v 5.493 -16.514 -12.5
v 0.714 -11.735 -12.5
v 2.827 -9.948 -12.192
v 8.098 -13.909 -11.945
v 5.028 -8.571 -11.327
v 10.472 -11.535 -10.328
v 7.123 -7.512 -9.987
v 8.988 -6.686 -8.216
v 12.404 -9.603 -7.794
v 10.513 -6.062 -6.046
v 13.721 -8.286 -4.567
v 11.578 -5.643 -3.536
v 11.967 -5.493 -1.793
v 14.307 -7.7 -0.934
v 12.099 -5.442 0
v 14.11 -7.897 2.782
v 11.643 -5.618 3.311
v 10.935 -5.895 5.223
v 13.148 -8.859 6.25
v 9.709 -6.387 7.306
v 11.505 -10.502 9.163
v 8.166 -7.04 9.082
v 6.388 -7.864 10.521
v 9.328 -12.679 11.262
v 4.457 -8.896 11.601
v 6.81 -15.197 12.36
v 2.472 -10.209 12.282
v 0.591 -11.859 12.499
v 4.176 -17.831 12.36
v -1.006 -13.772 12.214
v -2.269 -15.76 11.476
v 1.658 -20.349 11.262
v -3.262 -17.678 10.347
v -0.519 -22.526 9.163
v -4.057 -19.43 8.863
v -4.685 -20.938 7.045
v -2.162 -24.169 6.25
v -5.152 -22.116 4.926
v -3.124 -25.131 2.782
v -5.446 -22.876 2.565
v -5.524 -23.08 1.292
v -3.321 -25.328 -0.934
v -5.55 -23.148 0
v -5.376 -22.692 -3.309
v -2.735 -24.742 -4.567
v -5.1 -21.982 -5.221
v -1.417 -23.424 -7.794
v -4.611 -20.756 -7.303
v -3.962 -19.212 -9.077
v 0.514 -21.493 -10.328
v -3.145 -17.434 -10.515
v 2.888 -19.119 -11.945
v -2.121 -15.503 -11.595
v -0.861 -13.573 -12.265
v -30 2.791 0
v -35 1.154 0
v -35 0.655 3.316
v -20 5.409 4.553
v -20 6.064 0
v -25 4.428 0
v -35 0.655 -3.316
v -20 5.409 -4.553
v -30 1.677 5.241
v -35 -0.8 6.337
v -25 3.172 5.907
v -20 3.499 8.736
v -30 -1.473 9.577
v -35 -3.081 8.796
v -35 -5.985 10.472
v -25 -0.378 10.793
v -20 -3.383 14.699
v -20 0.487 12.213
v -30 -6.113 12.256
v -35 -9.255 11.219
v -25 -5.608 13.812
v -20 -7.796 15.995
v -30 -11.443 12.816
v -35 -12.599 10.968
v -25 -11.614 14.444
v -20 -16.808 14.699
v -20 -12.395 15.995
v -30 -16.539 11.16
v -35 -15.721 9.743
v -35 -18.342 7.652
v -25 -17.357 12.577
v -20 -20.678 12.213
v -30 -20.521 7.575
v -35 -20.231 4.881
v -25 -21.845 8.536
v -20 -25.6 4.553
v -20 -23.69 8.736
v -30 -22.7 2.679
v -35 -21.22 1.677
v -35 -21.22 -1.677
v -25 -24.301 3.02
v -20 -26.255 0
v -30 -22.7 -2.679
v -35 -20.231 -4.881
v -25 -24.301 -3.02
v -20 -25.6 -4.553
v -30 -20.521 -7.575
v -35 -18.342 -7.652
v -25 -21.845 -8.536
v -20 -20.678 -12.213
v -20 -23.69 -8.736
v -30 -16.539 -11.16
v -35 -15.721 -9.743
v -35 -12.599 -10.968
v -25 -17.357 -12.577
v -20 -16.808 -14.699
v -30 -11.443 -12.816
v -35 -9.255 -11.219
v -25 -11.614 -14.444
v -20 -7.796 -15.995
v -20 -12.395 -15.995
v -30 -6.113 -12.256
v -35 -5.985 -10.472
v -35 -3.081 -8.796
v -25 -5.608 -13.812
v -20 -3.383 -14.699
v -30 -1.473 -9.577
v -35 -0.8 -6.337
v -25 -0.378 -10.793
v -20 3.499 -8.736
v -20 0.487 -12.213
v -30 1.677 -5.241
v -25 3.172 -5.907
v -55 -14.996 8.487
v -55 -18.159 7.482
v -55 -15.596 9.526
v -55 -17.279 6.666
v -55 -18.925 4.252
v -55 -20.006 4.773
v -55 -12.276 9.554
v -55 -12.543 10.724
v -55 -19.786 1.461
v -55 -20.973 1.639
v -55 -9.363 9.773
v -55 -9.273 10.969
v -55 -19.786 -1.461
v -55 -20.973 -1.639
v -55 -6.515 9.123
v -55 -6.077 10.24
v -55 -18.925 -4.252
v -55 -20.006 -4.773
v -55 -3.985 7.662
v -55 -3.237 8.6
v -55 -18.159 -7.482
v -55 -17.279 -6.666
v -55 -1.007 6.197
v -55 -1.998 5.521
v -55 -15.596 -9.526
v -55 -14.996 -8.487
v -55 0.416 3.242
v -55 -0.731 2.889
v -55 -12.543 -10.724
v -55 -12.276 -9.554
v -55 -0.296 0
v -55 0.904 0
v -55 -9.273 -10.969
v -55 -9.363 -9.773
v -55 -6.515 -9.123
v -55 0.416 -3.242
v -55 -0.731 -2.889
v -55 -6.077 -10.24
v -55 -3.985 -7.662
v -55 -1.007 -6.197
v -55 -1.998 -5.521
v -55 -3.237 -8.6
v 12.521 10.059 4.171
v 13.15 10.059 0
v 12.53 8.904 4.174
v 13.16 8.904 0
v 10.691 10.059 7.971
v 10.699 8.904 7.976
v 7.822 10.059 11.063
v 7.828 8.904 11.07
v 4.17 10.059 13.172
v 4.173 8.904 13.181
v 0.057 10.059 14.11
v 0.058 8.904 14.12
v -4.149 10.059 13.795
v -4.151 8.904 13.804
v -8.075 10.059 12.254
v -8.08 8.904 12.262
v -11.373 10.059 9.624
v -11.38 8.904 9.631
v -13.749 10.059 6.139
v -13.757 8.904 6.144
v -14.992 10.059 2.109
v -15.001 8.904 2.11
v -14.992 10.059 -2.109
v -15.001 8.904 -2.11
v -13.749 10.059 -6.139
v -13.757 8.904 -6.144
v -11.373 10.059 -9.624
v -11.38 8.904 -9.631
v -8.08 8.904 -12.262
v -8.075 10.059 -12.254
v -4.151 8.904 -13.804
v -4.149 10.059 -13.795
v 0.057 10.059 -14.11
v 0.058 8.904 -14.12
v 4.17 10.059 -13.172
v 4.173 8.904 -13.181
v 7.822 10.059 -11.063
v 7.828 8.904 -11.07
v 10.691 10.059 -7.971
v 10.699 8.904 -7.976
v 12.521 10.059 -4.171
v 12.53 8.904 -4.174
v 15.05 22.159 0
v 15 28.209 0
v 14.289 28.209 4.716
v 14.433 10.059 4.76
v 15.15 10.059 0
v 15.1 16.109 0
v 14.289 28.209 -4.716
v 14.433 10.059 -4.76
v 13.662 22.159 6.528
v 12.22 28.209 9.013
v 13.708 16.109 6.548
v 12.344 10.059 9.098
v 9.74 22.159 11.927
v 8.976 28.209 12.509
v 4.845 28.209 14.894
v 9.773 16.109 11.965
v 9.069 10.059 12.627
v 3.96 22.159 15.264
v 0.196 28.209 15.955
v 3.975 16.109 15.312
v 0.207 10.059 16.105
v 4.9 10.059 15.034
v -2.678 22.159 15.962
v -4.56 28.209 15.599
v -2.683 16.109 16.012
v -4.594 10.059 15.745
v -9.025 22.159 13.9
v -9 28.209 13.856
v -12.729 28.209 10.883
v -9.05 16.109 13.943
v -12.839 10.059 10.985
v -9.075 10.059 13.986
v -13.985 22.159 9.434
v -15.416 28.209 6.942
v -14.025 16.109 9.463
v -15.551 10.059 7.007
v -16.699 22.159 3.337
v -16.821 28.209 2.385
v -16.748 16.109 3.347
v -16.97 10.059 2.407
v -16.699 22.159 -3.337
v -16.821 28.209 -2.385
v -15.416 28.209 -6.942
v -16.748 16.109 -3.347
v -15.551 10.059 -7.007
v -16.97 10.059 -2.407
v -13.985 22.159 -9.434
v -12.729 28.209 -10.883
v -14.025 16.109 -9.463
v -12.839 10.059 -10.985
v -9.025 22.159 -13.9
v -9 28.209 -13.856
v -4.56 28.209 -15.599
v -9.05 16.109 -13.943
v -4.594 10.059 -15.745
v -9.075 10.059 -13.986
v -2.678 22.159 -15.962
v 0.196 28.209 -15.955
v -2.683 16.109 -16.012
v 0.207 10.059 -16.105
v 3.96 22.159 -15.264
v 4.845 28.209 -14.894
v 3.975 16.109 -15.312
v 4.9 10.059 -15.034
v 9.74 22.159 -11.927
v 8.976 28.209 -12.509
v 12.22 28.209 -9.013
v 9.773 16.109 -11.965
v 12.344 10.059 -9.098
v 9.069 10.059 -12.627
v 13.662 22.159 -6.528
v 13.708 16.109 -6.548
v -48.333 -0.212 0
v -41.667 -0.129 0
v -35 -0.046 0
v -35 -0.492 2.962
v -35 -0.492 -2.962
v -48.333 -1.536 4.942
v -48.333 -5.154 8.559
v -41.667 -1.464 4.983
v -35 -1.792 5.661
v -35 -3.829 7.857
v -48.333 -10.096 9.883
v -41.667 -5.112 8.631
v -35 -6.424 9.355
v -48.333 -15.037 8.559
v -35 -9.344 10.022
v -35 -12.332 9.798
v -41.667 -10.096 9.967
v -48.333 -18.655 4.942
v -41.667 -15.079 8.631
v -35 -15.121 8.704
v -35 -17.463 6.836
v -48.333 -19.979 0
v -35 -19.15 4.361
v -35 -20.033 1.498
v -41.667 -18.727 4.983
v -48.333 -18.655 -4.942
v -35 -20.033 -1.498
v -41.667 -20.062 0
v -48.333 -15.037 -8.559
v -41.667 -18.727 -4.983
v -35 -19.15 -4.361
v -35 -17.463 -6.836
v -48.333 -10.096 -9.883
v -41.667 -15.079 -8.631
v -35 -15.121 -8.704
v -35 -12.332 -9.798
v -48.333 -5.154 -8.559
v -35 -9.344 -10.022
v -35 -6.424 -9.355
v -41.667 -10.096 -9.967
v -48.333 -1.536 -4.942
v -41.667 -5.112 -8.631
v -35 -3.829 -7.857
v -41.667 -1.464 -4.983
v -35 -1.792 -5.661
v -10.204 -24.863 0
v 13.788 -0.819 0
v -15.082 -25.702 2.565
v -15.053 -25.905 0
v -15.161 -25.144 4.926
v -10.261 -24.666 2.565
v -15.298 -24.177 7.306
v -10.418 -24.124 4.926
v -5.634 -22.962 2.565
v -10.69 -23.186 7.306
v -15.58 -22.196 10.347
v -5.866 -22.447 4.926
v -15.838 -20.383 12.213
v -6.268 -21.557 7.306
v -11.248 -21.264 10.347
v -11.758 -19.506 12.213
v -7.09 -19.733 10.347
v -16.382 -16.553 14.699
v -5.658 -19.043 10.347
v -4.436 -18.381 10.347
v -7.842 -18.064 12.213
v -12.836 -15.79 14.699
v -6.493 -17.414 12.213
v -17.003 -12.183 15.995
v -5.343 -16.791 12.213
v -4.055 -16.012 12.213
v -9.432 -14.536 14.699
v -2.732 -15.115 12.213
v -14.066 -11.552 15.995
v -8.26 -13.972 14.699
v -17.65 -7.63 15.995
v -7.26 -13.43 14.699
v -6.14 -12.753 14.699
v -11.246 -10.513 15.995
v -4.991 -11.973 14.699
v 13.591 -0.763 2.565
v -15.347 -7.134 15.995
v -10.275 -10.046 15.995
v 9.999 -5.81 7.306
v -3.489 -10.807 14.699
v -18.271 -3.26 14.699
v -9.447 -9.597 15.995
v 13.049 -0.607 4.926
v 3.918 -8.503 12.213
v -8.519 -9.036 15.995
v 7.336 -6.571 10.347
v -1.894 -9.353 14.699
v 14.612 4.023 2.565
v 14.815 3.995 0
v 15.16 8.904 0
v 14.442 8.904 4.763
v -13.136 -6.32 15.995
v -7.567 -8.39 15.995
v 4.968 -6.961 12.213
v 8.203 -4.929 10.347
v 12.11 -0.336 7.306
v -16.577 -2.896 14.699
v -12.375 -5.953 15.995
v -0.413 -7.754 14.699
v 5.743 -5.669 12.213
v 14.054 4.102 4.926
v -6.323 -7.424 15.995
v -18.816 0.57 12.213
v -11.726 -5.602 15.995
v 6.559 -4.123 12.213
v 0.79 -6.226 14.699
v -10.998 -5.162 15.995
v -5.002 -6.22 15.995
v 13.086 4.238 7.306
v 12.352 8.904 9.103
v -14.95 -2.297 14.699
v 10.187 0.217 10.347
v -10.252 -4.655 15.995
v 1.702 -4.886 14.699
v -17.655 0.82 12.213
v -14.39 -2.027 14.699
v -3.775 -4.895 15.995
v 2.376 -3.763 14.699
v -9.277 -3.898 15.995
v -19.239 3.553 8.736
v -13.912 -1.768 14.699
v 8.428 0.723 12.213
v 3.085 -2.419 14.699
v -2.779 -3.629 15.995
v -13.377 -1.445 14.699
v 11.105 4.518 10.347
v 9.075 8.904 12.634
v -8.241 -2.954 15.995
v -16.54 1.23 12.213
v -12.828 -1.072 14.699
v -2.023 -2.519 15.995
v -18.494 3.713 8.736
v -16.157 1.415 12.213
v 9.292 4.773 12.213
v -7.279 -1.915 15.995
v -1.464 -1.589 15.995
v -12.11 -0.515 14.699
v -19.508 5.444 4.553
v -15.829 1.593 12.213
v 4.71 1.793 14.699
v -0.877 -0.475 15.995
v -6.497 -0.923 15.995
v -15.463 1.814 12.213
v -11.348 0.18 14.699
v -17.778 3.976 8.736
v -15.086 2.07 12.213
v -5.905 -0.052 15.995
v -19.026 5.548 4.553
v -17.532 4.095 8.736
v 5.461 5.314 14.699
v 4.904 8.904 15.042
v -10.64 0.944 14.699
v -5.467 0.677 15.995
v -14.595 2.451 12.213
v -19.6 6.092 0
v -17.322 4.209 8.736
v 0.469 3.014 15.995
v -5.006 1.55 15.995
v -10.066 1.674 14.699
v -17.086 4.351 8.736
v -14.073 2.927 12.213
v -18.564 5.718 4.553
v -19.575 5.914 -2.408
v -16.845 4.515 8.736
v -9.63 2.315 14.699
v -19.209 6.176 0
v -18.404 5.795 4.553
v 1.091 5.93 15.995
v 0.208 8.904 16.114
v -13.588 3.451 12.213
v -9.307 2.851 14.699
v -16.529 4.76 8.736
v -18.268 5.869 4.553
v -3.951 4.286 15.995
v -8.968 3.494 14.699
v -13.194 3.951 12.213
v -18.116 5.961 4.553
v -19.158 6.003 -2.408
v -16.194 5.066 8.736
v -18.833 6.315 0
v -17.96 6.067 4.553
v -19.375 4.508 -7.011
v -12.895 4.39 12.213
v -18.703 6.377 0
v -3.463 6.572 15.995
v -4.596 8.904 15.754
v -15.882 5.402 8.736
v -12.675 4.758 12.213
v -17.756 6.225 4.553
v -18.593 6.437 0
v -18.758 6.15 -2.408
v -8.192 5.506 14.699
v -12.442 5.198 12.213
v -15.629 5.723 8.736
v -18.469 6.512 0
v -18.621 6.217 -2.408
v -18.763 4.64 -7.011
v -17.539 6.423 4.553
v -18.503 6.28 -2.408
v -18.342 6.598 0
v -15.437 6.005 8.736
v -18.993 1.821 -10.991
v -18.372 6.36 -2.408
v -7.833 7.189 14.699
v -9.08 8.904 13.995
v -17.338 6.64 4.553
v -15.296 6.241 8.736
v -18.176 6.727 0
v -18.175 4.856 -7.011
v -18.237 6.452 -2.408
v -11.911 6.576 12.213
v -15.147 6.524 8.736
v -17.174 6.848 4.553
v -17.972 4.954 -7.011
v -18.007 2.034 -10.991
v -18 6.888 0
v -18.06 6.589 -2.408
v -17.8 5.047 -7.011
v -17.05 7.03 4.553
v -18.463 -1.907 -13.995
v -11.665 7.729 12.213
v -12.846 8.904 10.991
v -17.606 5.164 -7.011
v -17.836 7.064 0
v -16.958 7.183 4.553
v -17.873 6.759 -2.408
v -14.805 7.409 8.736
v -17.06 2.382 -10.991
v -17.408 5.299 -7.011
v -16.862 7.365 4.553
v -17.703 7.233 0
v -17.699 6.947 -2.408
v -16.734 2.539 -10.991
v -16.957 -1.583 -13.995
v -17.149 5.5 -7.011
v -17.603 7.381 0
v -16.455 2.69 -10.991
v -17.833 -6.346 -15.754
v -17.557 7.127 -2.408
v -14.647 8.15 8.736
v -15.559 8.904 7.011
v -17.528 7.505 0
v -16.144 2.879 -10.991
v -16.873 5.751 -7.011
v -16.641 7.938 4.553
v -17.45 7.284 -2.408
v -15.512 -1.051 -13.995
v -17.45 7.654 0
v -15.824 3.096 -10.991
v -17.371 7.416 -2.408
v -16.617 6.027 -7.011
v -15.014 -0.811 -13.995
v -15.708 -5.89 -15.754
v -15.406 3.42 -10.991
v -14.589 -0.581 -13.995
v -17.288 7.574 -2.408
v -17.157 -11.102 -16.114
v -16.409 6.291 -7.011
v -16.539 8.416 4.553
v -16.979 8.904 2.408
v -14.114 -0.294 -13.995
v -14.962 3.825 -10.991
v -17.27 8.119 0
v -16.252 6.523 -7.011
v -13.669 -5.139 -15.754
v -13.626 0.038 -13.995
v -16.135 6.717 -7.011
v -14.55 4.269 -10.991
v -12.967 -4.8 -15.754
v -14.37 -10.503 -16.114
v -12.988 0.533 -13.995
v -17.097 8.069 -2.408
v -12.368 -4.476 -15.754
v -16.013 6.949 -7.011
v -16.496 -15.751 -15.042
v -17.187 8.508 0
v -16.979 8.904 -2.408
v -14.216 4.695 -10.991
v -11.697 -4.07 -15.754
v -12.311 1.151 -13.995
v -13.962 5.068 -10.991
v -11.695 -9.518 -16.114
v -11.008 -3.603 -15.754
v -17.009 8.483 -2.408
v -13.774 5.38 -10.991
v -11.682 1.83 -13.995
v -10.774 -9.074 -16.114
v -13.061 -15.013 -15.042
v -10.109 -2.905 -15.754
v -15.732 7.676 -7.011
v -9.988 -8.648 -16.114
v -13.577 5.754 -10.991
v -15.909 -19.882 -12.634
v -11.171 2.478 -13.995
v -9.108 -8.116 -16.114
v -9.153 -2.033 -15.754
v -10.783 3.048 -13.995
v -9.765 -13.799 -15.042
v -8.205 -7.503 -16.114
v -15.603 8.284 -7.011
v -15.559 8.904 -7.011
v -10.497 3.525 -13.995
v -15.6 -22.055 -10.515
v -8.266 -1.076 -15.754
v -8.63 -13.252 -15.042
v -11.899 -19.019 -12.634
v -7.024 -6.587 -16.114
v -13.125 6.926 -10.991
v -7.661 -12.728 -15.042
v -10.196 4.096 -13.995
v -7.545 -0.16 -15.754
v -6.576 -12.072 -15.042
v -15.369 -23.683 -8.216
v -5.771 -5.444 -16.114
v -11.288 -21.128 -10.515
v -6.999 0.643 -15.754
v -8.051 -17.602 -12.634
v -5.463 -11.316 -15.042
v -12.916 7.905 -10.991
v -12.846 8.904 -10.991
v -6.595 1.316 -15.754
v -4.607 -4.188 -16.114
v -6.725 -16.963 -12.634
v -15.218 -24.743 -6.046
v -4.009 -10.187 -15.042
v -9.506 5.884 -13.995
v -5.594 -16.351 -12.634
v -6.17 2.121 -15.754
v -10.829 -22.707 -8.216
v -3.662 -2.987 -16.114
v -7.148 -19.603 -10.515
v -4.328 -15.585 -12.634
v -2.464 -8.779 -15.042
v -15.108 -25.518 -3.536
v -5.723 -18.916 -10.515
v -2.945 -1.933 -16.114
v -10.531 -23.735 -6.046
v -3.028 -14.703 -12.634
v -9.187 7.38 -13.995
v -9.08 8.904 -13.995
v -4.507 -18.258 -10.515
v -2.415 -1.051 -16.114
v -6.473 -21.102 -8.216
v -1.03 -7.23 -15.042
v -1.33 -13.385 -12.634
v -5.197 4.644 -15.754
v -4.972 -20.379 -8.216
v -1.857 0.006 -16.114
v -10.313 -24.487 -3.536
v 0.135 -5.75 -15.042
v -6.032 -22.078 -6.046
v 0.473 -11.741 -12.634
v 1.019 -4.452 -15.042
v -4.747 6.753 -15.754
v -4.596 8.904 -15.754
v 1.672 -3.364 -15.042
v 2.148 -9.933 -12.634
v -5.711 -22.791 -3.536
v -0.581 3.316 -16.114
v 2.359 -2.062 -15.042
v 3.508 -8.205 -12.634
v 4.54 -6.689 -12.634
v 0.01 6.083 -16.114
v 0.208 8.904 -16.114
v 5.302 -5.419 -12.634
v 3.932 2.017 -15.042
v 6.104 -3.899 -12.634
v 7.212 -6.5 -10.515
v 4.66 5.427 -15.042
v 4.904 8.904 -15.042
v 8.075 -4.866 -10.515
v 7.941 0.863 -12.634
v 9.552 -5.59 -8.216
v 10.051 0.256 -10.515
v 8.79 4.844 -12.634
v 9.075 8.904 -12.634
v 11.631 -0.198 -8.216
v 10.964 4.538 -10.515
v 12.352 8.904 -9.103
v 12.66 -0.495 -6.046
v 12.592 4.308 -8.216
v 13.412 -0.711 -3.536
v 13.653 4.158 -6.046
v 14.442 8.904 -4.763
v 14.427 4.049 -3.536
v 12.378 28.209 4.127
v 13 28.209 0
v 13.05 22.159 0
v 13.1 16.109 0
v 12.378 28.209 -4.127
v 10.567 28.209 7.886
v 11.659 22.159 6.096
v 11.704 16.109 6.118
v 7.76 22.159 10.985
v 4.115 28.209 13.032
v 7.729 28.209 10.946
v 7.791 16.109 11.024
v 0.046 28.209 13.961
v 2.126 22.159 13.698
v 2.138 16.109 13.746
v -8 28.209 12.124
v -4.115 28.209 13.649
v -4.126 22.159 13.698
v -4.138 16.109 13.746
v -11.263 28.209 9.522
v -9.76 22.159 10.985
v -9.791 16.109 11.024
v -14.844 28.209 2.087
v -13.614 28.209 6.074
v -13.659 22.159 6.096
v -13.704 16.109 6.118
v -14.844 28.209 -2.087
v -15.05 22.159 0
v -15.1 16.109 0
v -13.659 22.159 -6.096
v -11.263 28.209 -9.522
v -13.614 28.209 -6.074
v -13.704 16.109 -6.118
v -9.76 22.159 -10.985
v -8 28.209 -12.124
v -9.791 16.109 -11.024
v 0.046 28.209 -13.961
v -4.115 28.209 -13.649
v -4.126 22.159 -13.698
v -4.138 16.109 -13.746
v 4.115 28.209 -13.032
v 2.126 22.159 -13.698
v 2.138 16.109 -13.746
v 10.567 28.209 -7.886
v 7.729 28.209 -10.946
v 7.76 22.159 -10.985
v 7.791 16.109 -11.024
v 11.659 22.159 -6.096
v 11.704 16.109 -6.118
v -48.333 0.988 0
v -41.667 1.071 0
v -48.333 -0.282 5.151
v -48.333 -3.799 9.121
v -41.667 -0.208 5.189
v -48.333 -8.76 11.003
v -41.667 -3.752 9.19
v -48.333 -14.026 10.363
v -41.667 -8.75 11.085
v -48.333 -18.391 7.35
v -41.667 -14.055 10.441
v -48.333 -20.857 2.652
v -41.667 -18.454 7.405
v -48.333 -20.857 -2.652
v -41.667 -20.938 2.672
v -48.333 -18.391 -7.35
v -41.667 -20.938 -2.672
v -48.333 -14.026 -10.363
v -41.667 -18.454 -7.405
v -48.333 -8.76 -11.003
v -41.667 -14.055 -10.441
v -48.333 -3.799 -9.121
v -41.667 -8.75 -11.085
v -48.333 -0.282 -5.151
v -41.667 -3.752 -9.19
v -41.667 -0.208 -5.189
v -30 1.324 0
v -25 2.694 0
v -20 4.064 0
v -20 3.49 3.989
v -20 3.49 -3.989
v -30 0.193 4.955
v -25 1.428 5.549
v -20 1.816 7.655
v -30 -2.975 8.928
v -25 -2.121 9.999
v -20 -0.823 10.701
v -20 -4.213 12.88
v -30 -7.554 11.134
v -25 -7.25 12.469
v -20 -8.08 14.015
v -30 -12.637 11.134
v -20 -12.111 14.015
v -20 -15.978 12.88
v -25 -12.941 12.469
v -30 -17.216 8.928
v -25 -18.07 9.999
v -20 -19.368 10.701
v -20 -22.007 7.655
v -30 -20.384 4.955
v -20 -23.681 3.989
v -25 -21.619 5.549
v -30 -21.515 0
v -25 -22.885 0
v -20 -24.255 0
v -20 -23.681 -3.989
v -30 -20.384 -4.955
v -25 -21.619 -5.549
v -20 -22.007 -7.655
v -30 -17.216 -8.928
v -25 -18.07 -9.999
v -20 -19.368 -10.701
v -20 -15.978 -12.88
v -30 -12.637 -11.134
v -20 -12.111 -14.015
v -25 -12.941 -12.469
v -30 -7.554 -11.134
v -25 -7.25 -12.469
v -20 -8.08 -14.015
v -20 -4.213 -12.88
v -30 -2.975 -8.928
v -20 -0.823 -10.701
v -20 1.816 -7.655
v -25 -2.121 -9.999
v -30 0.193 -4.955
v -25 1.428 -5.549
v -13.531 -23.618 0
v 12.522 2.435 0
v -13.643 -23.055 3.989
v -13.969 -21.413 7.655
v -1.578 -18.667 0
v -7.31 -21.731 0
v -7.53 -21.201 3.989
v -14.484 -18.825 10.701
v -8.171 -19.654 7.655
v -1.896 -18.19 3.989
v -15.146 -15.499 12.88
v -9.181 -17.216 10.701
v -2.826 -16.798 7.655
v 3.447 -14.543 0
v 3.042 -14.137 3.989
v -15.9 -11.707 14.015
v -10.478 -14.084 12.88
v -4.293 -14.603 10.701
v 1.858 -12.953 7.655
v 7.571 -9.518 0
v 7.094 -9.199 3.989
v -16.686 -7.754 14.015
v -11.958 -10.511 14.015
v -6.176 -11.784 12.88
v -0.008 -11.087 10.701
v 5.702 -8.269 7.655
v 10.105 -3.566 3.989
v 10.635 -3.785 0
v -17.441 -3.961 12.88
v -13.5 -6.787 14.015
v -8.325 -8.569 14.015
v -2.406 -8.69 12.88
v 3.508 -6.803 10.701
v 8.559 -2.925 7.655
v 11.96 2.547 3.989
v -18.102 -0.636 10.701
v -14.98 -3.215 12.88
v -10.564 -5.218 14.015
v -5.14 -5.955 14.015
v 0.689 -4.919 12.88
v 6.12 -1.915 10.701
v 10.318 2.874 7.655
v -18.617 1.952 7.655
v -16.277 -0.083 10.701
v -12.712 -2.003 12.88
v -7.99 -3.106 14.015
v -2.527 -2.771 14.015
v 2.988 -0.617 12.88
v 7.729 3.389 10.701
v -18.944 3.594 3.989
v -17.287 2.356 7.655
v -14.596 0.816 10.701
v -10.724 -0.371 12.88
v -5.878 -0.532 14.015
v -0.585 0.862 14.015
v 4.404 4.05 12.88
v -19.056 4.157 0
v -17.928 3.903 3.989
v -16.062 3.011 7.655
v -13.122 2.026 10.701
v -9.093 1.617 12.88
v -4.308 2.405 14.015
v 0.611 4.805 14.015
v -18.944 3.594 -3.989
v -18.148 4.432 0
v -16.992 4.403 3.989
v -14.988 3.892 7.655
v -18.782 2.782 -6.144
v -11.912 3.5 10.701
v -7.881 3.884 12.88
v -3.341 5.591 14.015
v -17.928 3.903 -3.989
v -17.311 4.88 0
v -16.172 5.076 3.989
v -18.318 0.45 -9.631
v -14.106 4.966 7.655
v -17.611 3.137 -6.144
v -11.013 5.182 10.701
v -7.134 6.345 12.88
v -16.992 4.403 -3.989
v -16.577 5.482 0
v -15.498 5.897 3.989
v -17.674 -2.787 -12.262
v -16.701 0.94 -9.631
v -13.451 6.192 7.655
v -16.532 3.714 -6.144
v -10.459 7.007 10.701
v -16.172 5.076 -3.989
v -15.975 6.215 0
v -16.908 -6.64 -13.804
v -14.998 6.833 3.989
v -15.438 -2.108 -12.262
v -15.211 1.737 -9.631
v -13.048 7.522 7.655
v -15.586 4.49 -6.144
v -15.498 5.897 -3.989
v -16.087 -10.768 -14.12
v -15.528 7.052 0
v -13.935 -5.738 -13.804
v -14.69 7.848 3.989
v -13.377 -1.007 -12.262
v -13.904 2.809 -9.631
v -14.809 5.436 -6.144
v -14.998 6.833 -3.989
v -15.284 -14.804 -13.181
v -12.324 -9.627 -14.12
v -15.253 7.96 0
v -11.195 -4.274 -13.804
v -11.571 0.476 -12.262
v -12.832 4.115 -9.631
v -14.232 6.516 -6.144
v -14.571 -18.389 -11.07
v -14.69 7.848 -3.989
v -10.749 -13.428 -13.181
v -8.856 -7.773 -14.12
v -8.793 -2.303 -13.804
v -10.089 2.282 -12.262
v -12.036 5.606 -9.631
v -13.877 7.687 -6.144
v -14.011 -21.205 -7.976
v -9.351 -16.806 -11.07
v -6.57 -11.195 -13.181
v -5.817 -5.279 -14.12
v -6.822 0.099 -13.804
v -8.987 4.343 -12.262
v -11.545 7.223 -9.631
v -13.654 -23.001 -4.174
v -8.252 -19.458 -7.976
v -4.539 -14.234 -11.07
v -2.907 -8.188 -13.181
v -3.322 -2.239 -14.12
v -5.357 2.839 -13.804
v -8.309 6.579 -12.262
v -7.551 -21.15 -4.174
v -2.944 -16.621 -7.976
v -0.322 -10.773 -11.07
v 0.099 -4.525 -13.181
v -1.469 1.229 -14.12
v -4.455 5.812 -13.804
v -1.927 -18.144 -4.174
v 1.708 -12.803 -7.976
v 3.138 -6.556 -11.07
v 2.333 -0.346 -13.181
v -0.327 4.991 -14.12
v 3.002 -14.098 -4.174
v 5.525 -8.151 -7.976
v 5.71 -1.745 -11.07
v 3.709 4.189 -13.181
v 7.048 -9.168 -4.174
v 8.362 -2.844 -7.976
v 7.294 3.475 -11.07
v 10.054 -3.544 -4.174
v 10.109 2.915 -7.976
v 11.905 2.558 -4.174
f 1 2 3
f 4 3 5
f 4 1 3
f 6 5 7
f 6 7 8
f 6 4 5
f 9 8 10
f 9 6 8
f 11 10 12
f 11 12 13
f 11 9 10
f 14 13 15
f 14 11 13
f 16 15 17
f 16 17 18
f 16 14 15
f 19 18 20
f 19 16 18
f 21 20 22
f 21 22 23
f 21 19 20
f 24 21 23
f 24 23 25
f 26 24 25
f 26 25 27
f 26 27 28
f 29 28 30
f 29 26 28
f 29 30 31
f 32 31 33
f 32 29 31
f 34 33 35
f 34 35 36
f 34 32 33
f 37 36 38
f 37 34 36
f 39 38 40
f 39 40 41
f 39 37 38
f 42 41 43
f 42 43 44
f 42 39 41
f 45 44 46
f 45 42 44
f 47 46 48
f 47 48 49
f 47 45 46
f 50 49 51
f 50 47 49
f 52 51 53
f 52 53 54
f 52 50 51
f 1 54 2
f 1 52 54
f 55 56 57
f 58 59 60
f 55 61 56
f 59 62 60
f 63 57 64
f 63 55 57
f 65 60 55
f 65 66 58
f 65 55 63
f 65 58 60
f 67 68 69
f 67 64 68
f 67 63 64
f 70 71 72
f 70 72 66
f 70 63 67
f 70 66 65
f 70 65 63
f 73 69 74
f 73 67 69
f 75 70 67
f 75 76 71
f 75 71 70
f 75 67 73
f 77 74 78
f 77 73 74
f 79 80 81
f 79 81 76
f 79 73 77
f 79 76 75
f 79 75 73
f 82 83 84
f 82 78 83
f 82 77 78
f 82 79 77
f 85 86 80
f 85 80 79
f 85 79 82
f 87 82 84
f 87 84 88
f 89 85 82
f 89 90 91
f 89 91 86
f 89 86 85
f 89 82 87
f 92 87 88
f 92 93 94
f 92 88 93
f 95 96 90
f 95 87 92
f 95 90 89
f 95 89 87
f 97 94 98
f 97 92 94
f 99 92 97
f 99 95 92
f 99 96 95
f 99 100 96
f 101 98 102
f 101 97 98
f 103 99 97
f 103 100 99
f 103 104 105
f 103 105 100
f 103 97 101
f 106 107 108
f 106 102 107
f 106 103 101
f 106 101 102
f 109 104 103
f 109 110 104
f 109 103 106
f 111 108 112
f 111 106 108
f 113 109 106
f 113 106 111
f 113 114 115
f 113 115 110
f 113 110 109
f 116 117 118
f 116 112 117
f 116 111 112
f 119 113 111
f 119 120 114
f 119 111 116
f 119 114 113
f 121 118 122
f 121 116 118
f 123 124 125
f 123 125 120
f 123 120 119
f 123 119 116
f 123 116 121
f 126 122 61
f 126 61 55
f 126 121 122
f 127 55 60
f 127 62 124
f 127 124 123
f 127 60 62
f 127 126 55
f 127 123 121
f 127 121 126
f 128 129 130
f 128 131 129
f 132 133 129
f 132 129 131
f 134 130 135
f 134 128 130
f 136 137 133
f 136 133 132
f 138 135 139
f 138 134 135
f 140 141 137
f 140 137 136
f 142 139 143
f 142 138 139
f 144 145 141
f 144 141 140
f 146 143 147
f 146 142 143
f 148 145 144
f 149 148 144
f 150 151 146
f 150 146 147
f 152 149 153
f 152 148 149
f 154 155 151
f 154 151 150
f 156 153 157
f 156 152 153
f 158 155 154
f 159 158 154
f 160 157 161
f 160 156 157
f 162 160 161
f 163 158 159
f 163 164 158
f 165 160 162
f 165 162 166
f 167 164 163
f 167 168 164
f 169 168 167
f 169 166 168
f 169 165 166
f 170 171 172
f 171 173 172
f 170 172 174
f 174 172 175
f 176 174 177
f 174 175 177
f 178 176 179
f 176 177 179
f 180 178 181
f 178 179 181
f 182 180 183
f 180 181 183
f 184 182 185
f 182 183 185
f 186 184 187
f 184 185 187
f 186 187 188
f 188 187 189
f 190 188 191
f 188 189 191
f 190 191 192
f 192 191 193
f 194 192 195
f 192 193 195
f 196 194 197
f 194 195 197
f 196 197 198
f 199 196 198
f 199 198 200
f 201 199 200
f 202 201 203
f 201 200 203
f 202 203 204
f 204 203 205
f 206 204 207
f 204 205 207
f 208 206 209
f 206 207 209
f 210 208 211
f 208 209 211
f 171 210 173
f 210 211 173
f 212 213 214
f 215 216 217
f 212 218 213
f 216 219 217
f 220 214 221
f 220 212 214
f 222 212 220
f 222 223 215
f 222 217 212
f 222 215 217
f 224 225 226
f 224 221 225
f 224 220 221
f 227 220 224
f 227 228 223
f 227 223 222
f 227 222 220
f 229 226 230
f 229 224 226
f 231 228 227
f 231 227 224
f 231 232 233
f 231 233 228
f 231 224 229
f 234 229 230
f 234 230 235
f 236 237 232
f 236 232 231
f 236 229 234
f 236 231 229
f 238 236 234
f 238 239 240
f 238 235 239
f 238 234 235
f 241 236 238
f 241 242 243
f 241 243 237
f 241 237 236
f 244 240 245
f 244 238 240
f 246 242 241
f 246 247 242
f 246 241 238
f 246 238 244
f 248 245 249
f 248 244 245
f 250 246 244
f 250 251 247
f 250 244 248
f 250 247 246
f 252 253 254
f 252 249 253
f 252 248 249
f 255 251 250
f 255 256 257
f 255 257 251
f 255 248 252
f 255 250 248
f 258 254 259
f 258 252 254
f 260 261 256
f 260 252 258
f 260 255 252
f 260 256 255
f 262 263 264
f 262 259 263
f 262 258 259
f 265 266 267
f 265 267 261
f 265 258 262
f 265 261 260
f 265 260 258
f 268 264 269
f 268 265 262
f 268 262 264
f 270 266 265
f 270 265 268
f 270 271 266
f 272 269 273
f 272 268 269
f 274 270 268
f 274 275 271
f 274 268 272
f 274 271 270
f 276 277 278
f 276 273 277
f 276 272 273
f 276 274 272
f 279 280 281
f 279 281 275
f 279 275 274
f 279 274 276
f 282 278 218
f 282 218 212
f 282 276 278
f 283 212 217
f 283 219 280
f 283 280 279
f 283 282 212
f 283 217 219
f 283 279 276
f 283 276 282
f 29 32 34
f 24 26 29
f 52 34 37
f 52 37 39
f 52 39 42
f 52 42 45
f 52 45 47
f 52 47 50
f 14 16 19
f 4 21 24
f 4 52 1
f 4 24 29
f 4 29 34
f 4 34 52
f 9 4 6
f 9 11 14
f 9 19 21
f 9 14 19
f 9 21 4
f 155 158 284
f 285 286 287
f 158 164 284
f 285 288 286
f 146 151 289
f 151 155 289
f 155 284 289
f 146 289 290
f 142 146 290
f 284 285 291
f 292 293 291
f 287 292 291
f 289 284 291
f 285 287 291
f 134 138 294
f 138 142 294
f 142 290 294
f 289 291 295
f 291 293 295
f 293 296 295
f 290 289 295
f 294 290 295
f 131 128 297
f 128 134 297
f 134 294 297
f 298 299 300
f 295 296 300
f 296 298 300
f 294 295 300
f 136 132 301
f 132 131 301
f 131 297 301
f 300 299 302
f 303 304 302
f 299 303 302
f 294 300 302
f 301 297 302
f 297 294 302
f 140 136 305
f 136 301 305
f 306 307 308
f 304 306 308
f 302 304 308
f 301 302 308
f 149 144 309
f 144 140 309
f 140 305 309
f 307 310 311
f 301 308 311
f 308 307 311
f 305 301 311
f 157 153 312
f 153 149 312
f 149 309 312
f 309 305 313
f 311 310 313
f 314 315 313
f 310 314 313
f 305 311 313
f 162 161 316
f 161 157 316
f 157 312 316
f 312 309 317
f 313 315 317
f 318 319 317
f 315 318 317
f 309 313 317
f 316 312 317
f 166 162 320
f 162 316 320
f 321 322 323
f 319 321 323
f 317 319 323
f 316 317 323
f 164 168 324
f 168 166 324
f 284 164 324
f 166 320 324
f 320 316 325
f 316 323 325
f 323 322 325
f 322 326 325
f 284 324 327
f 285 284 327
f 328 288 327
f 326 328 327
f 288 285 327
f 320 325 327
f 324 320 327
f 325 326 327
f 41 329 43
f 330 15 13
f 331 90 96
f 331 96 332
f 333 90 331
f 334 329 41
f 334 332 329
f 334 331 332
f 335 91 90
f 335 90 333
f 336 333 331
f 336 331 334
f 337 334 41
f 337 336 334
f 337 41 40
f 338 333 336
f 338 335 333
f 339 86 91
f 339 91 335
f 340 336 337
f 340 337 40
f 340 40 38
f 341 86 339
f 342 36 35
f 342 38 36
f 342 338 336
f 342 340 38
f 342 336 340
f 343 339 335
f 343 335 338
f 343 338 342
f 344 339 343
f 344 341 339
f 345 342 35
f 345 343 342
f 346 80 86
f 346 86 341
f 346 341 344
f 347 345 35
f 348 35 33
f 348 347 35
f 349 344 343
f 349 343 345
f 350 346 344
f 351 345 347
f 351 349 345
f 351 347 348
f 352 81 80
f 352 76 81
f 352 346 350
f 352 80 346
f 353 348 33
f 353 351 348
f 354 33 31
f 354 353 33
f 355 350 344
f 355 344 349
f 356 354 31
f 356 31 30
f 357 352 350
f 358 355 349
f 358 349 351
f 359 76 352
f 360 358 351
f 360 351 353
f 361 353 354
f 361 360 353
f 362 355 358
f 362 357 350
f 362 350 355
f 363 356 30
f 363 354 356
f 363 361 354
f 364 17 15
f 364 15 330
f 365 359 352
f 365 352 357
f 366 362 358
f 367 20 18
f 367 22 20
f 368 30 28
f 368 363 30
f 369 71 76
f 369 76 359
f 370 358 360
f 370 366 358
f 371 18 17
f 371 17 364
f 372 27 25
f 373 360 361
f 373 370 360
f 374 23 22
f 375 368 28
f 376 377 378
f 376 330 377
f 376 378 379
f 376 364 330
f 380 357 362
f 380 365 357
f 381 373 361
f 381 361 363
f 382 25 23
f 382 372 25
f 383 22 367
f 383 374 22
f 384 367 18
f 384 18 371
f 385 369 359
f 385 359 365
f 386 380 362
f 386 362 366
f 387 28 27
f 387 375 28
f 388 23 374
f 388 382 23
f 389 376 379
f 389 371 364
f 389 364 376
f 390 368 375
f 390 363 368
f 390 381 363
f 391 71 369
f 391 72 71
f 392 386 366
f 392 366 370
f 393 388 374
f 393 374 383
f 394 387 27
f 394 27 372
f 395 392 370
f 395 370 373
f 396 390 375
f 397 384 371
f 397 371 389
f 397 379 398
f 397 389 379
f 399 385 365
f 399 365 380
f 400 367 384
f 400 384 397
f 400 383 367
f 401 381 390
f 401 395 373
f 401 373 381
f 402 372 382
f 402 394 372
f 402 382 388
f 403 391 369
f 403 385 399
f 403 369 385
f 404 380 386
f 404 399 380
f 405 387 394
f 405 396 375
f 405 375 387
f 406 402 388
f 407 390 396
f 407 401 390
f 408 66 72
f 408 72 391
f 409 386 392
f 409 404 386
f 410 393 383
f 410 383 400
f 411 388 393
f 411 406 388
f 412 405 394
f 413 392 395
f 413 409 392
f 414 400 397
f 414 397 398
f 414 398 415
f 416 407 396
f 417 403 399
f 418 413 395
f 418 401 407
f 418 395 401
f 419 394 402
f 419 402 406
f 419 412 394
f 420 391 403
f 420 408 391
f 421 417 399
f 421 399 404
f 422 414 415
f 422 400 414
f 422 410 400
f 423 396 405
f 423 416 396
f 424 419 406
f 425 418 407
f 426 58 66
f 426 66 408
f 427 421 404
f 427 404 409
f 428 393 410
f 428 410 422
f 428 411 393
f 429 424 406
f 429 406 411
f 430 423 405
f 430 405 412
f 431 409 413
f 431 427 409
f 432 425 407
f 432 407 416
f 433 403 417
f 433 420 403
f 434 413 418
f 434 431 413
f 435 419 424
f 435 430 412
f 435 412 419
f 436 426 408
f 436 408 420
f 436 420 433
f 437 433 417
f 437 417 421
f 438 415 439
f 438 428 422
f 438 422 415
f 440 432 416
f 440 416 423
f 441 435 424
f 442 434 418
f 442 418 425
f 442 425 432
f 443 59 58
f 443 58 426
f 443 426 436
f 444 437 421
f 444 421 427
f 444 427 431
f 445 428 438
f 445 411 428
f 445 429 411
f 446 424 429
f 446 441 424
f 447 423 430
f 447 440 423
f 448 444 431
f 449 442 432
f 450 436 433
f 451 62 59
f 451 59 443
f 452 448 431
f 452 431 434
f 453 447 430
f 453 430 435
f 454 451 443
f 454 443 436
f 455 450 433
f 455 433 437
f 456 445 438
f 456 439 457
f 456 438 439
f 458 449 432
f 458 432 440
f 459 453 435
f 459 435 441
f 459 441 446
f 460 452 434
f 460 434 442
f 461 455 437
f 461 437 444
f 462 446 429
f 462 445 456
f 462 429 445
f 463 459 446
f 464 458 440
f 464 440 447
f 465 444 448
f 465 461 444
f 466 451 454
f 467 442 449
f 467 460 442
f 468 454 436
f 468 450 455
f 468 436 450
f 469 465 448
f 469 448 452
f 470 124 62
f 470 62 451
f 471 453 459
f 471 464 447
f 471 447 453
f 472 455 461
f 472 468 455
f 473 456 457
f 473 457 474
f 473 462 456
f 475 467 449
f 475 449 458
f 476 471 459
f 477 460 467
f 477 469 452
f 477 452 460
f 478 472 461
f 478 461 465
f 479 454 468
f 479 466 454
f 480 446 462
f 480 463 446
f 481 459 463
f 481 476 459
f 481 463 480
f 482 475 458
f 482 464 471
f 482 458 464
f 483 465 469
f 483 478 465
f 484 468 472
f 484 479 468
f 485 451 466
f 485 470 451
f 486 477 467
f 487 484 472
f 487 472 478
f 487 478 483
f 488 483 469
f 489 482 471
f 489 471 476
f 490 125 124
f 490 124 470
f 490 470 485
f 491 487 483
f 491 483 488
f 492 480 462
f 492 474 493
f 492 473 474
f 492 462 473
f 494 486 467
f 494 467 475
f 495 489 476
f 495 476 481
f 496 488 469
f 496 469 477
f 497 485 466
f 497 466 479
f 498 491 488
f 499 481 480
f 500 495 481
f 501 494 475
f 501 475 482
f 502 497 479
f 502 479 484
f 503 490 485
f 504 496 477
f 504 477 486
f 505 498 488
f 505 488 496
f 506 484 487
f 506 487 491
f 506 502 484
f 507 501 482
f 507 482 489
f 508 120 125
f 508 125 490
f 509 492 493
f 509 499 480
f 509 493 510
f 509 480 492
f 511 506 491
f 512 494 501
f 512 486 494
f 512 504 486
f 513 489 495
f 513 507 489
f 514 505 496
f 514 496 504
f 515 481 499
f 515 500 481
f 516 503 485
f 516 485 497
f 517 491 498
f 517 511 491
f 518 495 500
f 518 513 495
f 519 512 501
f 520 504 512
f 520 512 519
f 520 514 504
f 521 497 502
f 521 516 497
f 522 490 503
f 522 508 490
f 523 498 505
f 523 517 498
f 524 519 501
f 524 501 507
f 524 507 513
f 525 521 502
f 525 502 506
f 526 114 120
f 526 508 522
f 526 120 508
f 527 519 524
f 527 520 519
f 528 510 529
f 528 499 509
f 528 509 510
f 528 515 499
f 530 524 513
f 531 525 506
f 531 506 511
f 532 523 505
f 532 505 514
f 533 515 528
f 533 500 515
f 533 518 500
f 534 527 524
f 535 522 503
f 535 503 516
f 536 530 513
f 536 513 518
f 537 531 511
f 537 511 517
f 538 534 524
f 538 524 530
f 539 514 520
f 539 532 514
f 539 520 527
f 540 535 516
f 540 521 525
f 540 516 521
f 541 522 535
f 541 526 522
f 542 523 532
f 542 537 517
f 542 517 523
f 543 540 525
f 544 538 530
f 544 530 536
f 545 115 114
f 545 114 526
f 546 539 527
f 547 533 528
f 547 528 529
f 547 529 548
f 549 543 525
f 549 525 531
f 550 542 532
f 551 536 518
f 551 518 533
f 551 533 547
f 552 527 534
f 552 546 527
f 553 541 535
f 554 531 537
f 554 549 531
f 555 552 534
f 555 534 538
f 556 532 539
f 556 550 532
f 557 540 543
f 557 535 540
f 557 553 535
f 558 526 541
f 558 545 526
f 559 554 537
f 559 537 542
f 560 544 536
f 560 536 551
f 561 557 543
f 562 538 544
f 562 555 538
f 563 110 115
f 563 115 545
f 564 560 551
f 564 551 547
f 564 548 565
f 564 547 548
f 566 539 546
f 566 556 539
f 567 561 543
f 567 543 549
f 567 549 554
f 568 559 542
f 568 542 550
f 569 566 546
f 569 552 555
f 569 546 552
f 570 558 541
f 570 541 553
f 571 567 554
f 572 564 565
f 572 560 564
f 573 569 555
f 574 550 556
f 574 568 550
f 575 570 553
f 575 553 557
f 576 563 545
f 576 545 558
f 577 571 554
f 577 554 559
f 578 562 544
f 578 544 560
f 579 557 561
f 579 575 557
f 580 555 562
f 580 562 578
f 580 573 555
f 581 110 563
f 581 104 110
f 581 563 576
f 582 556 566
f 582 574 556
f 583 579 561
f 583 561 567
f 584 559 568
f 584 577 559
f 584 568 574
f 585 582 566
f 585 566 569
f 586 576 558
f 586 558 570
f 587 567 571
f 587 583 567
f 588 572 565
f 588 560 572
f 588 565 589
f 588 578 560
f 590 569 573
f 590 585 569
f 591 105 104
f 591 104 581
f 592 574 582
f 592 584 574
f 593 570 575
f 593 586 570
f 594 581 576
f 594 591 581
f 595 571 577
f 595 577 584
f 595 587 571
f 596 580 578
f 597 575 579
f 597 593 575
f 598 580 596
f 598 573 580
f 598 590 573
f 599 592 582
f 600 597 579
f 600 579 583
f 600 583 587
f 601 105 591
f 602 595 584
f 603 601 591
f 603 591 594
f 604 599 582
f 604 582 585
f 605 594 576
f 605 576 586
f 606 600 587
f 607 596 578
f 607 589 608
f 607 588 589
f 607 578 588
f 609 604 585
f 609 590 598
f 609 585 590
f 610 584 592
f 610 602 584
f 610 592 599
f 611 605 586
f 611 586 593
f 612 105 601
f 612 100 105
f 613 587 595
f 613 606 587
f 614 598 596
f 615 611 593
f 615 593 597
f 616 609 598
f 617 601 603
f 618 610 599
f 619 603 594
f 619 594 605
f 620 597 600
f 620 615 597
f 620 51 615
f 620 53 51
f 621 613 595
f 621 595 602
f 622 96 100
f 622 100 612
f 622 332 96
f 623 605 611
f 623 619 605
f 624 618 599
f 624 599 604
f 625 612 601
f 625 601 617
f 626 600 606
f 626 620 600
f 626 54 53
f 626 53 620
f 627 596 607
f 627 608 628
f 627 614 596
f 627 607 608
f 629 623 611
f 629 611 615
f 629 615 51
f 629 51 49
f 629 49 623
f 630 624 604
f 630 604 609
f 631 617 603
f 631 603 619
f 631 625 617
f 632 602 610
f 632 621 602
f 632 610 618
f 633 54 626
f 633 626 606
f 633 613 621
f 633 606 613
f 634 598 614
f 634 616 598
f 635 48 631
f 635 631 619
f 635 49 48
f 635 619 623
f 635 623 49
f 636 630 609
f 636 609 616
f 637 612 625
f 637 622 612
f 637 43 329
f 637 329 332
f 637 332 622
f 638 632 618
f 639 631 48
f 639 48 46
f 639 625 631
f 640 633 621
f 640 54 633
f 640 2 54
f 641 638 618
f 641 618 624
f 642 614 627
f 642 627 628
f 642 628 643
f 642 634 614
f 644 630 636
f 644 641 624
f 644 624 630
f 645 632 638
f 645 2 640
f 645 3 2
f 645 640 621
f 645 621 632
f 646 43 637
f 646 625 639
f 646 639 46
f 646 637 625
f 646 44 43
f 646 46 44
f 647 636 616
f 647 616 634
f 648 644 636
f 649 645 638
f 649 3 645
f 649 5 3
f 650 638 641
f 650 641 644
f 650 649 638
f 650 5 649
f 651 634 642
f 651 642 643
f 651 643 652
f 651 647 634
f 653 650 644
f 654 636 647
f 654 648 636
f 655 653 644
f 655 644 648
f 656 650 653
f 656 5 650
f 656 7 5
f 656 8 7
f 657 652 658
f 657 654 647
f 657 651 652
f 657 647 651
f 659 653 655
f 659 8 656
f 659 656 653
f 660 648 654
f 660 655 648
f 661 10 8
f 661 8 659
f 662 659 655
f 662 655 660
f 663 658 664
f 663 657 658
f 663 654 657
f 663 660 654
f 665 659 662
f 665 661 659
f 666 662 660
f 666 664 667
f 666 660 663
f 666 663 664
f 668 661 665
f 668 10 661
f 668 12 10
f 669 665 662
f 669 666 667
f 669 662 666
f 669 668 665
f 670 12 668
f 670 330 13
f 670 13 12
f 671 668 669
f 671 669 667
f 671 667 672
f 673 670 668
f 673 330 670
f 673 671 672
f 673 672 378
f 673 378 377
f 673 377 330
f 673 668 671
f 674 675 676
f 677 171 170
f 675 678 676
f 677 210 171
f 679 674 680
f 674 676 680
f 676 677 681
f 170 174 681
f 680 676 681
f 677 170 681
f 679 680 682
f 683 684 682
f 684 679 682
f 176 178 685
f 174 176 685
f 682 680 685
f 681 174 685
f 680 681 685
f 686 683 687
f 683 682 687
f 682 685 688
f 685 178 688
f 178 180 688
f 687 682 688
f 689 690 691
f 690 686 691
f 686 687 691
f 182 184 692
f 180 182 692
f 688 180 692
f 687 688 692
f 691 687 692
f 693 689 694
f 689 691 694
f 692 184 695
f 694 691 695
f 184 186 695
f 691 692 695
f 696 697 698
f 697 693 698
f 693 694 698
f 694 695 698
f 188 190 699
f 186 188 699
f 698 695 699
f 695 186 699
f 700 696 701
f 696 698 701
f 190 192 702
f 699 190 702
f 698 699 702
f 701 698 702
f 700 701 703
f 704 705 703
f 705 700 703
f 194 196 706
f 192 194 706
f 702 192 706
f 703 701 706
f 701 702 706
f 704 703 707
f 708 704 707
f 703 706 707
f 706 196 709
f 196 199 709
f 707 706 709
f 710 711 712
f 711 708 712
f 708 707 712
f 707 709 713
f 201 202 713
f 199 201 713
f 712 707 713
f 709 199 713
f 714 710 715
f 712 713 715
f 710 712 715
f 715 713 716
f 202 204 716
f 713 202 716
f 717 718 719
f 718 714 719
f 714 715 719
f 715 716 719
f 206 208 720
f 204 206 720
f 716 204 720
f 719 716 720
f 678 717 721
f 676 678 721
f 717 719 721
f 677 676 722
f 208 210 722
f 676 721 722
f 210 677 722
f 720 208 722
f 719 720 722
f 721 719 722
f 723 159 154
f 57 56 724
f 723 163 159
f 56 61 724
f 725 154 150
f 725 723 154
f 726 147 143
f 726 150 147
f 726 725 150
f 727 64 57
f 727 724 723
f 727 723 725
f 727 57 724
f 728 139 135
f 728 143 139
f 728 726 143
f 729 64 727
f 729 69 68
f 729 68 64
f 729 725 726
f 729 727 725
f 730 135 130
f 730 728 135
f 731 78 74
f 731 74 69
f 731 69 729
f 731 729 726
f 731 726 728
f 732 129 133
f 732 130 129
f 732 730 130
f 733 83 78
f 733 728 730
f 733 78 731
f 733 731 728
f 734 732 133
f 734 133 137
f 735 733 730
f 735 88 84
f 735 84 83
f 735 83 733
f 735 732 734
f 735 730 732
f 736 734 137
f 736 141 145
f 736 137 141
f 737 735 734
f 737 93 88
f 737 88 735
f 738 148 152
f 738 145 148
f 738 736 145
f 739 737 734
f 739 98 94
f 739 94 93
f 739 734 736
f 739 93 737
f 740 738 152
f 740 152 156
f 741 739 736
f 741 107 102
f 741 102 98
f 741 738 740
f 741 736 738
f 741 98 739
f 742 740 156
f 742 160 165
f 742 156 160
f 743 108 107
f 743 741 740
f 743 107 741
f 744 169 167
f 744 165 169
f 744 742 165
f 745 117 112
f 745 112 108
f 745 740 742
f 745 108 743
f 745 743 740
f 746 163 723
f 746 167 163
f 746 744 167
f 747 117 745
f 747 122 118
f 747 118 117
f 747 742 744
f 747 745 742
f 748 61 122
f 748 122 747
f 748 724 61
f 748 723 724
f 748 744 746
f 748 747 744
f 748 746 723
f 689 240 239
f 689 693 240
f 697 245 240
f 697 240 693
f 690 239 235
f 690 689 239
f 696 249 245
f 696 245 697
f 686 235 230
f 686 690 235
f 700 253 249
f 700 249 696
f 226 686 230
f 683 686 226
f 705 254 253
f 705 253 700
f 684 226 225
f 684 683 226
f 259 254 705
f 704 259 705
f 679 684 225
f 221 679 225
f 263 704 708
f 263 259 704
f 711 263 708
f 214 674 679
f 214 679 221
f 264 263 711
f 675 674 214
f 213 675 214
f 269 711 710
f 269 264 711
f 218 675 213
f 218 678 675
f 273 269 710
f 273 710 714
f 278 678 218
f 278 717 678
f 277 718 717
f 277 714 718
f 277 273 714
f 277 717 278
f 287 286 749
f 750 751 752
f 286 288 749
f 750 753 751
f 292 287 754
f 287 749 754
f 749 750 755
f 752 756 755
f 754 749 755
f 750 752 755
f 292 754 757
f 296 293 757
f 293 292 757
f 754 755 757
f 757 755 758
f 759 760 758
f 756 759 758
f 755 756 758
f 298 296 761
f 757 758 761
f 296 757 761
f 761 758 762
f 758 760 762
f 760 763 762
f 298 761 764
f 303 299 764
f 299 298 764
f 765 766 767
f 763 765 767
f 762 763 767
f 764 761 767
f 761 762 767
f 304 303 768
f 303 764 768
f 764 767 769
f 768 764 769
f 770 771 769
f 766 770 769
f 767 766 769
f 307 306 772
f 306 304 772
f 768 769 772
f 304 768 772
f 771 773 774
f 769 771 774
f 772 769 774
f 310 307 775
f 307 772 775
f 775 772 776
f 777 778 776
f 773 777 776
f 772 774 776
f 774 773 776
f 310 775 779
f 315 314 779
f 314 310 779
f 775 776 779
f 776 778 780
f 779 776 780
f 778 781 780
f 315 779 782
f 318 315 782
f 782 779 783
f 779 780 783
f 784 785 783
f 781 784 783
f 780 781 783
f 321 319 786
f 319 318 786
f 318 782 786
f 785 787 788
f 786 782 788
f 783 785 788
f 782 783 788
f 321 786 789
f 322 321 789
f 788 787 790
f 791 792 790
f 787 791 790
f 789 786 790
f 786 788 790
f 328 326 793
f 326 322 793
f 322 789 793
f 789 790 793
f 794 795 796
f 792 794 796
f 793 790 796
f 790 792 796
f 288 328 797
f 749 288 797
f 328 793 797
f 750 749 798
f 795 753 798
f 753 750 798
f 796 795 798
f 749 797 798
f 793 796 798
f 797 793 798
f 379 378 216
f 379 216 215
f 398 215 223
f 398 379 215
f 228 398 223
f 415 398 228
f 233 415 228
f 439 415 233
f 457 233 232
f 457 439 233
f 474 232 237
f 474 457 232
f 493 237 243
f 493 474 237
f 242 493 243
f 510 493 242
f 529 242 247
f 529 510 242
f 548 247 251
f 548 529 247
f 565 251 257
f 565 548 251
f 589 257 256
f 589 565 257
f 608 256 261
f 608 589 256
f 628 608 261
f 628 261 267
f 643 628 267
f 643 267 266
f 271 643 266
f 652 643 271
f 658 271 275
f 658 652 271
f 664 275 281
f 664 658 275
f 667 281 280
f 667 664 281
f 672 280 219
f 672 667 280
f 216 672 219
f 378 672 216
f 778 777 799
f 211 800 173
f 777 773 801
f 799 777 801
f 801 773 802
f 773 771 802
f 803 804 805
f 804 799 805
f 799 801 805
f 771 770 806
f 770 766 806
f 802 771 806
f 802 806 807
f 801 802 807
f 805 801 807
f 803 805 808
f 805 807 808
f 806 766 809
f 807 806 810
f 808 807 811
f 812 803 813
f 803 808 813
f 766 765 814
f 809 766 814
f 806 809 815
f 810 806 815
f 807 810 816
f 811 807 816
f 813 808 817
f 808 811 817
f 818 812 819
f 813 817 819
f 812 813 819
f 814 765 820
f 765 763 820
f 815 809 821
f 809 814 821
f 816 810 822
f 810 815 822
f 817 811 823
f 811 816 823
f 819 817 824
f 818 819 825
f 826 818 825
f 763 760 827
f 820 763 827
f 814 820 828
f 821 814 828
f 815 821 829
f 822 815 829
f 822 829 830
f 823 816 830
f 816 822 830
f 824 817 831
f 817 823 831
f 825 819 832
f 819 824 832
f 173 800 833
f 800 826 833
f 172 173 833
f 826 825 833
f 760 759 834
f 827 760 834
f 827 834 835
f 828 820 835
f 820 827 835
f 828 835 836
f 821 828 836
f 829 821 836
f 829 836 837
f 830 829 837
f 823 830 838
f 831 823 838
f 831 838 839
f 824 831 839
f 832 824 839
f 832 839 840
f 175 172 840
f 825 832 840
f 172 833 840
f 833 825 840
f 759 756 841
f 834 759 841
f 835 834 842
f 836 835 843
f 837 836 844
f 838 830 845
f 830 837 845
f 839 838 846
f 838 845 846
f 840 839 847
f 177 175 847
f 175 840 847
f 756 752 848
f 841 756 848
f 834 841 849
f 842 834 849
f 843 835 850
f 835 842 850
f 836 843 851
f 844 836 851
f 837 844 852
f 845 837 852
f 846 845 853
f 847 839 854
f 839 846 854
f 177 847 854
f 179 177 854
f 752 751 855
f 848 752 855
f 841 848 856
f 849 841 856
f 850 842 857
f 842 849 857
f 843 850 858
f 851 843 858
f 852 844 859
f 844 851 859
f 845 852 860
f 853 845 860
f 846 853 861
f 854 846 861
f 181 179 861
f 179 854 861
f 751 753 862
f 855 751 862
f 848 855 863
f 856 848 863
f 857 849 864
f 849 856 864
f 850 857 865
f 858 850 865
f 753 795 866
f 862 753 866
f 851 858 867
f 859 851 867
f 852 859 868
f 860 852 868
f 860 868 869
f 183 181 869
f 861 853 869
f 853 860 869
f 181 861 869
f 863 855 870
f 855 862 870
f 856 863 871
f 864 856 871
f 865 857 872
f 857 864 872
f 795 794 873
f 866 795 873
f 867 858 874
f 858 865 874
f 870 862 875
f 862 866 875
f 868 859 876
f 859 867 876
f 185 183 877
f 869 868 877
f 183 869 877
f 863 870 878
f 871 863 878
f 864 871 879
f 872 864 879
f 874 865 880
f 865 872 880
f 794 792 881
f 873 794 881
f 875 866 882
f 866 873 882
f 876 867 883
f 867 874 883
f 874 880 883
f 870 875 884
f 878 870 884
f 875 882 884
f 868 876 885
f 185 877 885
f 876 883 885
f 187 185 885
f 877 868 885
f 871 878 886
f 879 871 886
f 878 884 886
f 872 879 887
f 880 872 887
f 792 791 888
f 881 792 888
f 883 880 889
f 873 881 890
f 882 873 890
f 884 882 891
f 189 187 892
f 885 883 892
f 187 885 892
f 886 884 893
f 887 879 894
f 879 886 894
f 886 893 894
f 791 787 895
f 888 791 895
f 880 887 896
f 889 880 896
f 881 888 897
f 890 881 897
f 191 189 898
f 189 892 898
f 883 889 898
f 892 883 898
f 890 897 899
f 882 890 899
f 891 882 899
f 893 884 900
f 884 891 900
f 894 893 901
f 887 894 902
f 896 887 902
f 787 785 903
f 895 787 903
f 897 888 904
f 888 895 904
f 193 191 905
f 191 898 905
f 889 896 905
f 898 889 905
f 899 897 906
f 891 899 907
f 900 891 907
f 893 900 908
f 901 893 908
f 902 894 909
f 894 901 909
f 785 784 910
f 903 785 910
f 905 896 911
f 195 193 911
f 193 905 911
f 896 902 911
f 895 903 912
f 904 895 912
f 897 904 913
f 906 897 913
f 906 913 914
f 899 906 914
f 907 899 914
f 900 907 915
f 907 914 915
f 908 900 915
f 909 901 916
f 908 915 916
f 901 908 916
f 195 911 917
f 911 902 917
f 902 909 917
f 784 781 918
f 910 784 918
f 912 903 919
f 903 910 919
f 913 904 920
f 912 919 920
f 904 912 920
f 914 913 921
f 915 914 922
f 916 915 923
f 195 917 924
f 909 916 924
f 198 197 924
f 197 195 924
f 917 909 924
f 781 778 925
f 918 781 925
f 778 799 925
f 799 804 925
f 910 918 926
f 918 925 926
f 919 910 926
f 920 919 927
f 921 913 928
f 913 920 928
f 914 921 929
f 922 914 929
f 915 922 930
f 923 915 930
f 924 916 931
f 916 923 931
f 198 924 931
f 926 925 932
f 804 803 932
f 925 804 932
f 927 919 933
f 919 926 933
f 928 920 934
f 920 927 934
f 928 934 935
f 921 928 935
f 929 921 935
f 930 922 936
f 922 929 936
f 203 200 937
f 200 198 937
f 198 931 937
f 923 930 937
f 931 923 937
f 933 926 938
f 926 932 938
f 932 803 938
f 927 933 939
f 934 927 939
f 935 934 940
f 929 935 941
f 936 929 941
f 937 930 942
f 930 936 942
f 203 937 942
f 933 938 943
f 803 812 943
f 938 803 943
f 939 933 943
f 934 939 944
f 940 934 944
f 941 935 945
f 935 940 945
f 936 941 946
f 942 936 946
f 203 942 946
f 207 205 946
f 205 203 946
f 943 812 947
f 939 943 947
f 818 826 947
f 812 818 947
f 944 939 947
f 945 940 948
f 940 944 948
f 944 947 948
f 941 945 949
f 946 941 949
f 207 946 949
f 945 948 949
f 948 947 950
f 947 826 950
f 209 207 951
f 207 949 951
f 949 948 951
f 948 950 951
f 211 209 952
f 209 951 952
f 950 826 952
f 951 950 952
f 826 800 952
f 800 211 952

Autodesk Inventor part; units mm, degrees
sketch "Sketch1" plane through (0, 0, 0) normal (0, 0, 1) x (1, 0, 0)
  line L0 (15, 28.2088) -> (15.15, 10.0588)
  line L1 (13, 28.2088) -> (13.15, 10.0588)
  line L2 (13.15, 10.0588) -> (13.1595, 8.9045)
  line L3 (15.15, 10.0588) -> (15.1653, 8.2088)
  line L4 (15.1653, 8.2088) -> (10.25, -5.7912)
  line L5 (10.25, -5.7912) -> (10.25, -5.7912)
  line L6 (8, -5.7712) -> (8, -5.7912)
  line L7 (13.1595, 8.9045) -> (8, -5.7912)
  line L8 (15, 28.2088) -> (13, 28.2088)
  line L9 (0, -12.5912) -> (0, 35.0088) construction
  line L10 (-1, 0) -> (-1, 28.2088) construction
  line L11 (10.25, -5.7912) -> (8, -5.7912)
  line L12 (13.1595, 8.9045) -> (15.1595, 8.9045)
  point P0 (0, 0)
  point P1 (0, 0)
  point P2 (-1, 22.6667)
  dimension "d0" = 2
  dimension "d1" = 2
  dimension "d2" = 0
  dimension "d3" = 0
  dimension "d4" = 18.15
  dimension "d5" = 1.9999
  dimension "d6" = 14
  dimension "d7" = 0
  dimension "d8" = 1.85
  dimension "d9" = 2.123
  dimension "d10" = 1
revolve "Revolution1" add sketch "Sketch1" angle 360 about axis through (-1, 0, 0) along (0, 1, 0) contours L0 L3 L12 L2 L1 L8
ref_plane "Work Plane1" through (-20, 0, 0) normal (1, 0, 0) x (0, 1, 0)
sketch "Sketch2" plane through (-20, 0, 0) normal (1, 0, 0) x (0, 1, 0)
  line L0 (8.9045, 14.1595) -> (8.9045, -14.1595) construction
  line L1 (8.9045, 0) -> (-10.0955, 0) construction
  point P0 (0, 0)
  dimension "d13" = 19
sketch "Sketch3" plane through (-1, 8.9045, 0) normal (0, -1, 0) x (1, 0, 0)
  circle A0 centre (0, 0) radius 16.1595 projected
  circle A1 centre (0, 0) radius 14.1595 projected
  point P0 (1, 0)
revolve "Revolution2" add sketch "Sketch3" angle 90 about axis through (-20, 8.9045, 14.1595) along (0, 0, -1)
ref_plane "Work Plane2" through (0, 0, 0) normal (0, 0, 1) x (1, 0, 0)
sketch "Sketch4" plane through (0, 0, 0) normal (0, 0, 1) x (1, 0, 0)
  line L0 (-20, 6.0641) -> (-20, -26.255) construction
  line L1 (-20, -10.0955) -> (-35, -10.0955) construction
  line L2 (-35, -10.0955) -> (-55, -10.0955) construction
  line L3 (-55, -10.0955) -> (-55, 0.9045) construction
  line L4 (-35, -10.0955) -> (-35, 1.1545) construction
  line L5 (-35, 1.1545) -> (-55, 0.9045)
  line L6 (-55, 0.9045) -> (-55, -0.2955)
  line L7 (-55, -0.2955) -> (-35, -0.0455)
  line L8 (-20, -24.255) -> (-20, 4.0641) projected
  line L9 (-20, 4.0641) -> (-35, -0.0455)
  line L10 (-35, 1.1545) -> (-20, 6.0641)
  line L11 (-20, 6.0641) -> (-20, 4.0641)
  point P0 (0, 0)
  dimension "d16" = 15
  dimension "d17" = 20
  dimension "d18" = 11
  dimension "d19" = 11.25
  dimension "d20" = 1.2
  dimension "d21" = 1.2
revolve "Revolution3" add sketch "Sketch4" angle 360 about axis through (-35, -10.0955, 0) along (-1, 0, 0)
ref_plane "Work Plane4" through (5.4558, -16.5513, 14.1595) normal (0.7071068, -0.7071068, 0) x (0, 0, -1)
ref_plane "Work Plane3" through (-20, 8.9045, 14.1595) normal (0.7071068, -0.7071068, 0) x (0, 0, -1)
sketch "Sketch5" plane through (5.4558, -16.5513, 14.1595) normal (0.7071068, -0.7071068, 0) x (0, 0, -1)
  circle A0 centre (14.1595, 0.0528) radius 12.5
  point P0 (14.1595, 7.8457)
  dimension "d25" = 25
extrude "Extrusion1" add sketch "Sketch5" against normal up to surface
properties part number "Ambu90deg"
